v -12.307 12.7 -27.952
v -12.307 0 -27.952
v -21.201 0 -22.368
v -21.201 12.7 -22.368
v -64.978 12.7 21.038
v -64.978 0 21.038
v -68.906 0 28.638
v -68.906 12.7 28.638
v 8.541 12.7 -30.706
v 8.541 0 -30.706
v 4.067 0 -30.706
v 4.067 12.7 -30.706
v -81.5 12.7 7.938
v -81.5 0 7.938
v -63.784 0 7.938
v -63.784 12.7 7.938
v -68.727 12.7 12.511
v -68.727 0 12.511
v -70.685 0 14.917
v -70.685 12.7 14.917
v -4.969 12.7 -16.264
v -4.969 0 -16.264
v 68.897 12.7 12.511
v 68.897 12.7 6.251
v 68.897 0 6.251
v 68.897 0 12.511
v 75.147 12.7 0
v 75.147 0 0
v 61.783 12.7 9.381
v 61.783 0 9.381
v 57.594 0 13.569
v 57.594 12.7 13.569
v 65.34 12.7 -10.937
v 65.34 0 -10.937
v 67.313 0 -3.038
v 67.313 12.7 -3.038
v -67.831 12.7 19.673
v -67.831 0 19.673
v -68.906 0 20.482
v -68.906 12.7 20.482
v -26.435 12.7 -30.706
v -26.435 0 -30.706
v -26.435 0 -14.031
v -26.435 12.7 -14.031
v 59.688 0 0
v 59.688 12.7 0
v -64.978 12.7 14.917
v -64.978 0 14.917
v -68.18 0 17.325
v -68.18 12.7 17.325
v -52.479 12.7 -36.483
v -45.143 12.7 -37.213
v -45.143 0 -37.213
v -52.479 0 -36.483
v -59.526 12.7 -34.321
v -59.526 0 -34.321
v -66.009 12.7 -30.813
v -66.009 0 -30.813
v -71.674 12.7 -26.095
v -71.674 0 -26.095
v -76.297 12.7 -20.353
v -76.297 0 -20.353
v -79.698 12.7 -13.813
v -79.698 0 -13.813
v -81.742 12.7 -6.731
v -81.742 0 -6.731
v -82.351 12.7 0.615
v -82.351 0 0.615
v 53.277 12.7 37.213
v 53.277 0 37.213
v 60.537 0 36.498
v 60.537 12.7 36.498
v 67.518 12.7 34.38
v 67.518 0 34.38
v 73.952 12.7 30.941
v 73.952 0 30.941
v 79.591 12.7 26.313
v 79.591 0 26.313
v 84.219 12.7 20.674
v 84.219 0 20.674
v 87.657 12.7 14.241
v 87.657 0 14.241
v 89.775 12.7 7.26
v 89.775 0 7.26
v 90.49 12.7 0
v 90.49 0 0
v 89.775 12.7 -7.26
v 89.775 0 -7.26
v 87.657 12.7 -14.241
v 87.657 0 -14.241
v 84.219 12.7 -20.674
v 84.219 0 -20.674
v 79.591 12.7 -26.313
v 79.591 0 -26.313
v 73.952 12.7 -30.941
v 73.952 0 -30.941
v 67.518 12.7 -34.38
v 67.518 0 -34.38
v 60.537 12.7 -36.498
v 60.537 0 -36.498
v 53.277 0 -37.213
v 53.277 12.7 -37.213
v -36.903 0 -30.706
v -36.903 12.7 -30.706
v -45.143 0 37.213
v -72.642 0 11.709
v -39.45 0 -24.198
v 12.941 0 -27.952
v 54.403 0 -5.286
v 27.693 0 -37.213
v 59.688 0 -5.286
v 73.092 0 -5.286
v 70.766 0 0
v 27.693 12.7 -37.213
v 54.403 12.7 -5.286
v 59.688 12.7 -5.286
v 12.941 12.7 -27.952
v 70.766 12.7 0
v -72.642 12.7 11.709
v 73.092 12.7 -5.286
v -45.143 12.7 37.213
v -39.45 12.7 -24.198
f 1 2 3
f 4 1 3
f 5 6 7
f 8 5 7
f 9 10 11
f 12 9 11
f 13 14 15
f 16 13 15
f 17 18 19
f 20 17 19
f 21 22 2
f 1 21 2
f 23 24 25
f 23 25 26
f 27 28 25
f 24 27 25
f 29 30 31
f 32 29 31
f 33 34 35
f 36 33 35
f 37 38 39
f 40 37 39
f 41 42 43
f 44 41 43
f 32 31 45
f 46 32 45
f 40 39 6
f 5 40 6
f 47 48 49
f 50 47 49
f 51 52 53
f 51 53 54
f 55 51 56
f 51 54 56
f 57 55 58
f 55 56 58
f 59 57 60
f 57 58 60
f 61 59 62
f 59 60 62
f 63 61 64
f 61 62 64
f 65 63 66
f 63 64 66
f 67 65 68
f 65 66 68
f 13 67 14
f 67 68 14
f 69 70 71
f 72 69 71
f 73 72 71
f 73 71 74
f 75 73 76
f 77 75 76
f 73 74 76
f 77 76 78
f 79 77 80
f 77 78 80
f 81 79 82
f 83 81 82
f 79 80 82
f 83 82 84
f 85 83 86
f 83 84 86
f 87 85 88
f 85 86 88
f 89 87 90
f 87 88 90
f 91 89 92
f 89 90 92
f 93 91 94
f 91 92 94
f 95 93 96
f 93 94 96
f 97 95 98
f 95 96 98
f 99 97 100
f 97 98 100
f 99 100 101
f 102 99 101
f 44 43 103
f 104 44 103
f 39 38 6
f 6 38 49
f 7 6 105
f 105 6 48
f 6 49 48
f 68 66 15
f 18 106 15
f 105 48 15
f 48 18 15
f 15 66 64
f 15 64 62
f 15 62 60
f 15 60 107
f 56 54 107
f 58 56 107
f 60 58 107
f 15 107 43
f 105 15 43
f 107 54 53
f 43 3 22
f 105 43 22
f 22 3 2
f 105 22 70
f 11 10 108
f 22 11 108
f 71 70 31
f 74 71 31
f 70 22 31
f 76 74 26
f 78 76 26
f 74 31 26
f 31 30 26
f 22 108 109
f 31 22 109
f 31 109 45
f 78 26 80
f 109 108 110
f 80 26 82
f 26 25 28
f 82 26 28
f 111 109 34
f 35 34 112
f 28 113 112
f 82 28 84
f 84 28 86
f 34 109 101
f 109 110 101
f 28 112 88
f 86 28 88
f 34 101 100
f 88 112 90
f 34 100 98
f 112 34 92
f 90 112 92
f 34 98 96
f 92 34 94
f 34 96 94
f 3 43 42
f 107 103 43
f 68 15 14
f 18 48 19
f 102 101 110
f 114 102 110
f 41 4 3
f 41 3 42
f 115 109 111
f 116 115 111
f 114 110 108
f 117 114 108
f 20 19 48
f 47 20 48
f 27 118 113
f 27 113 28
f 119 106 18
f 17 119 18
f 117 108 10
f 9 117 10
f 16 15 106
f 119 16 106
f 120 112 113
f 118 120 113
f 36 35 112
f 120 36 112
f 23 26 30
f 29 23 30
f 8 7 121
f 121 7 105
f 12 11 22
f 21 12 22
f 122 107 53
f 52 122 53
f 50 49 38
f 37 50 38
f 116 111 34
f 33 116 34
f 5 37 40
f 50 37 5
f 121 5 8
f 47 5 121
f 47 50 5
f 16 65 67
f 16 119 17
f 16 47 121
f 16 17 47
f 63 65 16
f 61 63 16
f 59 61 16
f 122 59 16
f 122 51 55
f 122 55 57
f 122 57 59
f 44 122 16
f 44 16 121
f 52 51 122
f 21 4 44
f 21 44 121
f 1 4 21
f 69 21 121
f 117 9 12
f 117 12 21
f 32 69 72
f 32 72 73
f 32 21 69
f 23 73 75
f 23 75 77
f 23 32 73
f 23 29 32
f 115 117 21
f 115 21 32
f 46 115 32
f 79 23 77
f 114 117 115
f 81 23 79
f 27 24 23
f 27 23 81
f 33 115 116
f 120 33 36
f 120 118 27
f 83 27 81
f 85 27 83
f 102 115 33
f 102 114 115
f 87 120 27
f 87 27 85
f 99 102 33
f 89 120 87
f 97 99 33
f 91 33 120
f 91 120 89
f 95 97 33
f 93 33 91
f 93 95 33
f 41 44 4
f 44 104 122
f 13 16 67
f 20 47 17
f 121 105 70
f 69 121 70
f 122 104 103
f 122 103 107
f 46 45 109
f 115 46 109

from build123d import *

# Parameters (mm, degrees)
BOSS_EXTRUDE1_DEPTH = 12.7


with BuildPart() as part:
    # Sketch1 → Boss-Extrude1 (new body)
    with BuildSketch(Plane(origin=(0, 0, 0), x_dir=(1, 0, 0), z_dir=(0, 1, 0))):
        with BuildLine():
            Line((53.277347388, 37.21280371), (27.692764767, 37.21280371))
            Line((27.692764767, 37.21280371), (12.941319101, 27.952087025))
            Line((12.941319101, 27.952087025), (8.540643474, 30.705646777))
            Line((8.540643474, 30.705646777), (4.066973083, 30.705646777))
            Line((4.066973083, 30.705646777), (-4.969353988, 16.263997468))
            Line((-4.969353988, 16.263997468), (-12.306945735, 27.952087025))
            Line((-12.306945735, 27.952087025), (-21.201307507, 22.368351957))
            Line((-21.201307507, 22.368351957), (-26.43532504, 30.705646777))
            Line((-26.43532504, 30.705646777), (-26.43532504, 14.031057137))
            Line((-26.43532504, 14.031057137), (-36.903360106, 30.705646777))
            Line((-36.903360106, 30.705646777), (-39.449638906, 24.198489844))
            Line((-39.449638906, 24.198489844), (-45.143401222, 37.21280371))
            ThreePointArc((-45.143401222, 37.21280371), (-74.127657469, 23.338929919), (-81.499787082, -7.937629821))
            Line((-81.499787082, -7.937629821), (-63.784157153, -7.937629821))
            Line((-63.784157153, -7.937629821), (-72.641972118, -11.70947558))
            Line((-72.641972118, -11.70947558), (-68.727071589, -12.511169013))
            Line((-68.727071589, -12.511169013), (-70.684521854, -14.91719786))
            Line((-70.684521854, -14.91719786), (-64.97814292, -14.91719786))
            Line((-64.97814292, -14.91719786), (-68.180229032, -17.32540427))
            Line((-68.180229032, -17.32540427), (-67.831332387, -19.673301397))
            Line((-67.831332387, -19.673301397), (-68.906488172, -20.481898343))
            Line((-68.906488172, -20.481898343), (-64.97814292, -21.037775518))
            Line((-64.97814292, -21.037775518), (-68.906488172, -28.637535833))
            Line((-68.906488172, -28.637535833), (-45.143401222, -37.21280371))
            Line((-45.143401222, -37.21280371), (53.277347388, -37.21280371))
            ThreePointArc((53.277347388, -37.21280371), (90.490151098, 0), (53.277347388, 37.21280371))
        make_face()
        Polygon((65.339708642, 10.937039543), (67.312961335, 3.038472361), (73.091855891, 5.285820244), (70.766094983, 0), (75.147452652, 0), (68.896846804, -6.250605848), (68.896846804, -12.511169013), (61.782570481, -9.38088743), (57.594408206, -13.569049705), (59.688489343, 0), (54.402669099, 5.285820244), (59.688489343, 5.285820244), align=None, mode=Mode.SUBTRACT)
    extrude(amount=BOSS_EXTRUDE1_DEPTH)


solid = part.part
